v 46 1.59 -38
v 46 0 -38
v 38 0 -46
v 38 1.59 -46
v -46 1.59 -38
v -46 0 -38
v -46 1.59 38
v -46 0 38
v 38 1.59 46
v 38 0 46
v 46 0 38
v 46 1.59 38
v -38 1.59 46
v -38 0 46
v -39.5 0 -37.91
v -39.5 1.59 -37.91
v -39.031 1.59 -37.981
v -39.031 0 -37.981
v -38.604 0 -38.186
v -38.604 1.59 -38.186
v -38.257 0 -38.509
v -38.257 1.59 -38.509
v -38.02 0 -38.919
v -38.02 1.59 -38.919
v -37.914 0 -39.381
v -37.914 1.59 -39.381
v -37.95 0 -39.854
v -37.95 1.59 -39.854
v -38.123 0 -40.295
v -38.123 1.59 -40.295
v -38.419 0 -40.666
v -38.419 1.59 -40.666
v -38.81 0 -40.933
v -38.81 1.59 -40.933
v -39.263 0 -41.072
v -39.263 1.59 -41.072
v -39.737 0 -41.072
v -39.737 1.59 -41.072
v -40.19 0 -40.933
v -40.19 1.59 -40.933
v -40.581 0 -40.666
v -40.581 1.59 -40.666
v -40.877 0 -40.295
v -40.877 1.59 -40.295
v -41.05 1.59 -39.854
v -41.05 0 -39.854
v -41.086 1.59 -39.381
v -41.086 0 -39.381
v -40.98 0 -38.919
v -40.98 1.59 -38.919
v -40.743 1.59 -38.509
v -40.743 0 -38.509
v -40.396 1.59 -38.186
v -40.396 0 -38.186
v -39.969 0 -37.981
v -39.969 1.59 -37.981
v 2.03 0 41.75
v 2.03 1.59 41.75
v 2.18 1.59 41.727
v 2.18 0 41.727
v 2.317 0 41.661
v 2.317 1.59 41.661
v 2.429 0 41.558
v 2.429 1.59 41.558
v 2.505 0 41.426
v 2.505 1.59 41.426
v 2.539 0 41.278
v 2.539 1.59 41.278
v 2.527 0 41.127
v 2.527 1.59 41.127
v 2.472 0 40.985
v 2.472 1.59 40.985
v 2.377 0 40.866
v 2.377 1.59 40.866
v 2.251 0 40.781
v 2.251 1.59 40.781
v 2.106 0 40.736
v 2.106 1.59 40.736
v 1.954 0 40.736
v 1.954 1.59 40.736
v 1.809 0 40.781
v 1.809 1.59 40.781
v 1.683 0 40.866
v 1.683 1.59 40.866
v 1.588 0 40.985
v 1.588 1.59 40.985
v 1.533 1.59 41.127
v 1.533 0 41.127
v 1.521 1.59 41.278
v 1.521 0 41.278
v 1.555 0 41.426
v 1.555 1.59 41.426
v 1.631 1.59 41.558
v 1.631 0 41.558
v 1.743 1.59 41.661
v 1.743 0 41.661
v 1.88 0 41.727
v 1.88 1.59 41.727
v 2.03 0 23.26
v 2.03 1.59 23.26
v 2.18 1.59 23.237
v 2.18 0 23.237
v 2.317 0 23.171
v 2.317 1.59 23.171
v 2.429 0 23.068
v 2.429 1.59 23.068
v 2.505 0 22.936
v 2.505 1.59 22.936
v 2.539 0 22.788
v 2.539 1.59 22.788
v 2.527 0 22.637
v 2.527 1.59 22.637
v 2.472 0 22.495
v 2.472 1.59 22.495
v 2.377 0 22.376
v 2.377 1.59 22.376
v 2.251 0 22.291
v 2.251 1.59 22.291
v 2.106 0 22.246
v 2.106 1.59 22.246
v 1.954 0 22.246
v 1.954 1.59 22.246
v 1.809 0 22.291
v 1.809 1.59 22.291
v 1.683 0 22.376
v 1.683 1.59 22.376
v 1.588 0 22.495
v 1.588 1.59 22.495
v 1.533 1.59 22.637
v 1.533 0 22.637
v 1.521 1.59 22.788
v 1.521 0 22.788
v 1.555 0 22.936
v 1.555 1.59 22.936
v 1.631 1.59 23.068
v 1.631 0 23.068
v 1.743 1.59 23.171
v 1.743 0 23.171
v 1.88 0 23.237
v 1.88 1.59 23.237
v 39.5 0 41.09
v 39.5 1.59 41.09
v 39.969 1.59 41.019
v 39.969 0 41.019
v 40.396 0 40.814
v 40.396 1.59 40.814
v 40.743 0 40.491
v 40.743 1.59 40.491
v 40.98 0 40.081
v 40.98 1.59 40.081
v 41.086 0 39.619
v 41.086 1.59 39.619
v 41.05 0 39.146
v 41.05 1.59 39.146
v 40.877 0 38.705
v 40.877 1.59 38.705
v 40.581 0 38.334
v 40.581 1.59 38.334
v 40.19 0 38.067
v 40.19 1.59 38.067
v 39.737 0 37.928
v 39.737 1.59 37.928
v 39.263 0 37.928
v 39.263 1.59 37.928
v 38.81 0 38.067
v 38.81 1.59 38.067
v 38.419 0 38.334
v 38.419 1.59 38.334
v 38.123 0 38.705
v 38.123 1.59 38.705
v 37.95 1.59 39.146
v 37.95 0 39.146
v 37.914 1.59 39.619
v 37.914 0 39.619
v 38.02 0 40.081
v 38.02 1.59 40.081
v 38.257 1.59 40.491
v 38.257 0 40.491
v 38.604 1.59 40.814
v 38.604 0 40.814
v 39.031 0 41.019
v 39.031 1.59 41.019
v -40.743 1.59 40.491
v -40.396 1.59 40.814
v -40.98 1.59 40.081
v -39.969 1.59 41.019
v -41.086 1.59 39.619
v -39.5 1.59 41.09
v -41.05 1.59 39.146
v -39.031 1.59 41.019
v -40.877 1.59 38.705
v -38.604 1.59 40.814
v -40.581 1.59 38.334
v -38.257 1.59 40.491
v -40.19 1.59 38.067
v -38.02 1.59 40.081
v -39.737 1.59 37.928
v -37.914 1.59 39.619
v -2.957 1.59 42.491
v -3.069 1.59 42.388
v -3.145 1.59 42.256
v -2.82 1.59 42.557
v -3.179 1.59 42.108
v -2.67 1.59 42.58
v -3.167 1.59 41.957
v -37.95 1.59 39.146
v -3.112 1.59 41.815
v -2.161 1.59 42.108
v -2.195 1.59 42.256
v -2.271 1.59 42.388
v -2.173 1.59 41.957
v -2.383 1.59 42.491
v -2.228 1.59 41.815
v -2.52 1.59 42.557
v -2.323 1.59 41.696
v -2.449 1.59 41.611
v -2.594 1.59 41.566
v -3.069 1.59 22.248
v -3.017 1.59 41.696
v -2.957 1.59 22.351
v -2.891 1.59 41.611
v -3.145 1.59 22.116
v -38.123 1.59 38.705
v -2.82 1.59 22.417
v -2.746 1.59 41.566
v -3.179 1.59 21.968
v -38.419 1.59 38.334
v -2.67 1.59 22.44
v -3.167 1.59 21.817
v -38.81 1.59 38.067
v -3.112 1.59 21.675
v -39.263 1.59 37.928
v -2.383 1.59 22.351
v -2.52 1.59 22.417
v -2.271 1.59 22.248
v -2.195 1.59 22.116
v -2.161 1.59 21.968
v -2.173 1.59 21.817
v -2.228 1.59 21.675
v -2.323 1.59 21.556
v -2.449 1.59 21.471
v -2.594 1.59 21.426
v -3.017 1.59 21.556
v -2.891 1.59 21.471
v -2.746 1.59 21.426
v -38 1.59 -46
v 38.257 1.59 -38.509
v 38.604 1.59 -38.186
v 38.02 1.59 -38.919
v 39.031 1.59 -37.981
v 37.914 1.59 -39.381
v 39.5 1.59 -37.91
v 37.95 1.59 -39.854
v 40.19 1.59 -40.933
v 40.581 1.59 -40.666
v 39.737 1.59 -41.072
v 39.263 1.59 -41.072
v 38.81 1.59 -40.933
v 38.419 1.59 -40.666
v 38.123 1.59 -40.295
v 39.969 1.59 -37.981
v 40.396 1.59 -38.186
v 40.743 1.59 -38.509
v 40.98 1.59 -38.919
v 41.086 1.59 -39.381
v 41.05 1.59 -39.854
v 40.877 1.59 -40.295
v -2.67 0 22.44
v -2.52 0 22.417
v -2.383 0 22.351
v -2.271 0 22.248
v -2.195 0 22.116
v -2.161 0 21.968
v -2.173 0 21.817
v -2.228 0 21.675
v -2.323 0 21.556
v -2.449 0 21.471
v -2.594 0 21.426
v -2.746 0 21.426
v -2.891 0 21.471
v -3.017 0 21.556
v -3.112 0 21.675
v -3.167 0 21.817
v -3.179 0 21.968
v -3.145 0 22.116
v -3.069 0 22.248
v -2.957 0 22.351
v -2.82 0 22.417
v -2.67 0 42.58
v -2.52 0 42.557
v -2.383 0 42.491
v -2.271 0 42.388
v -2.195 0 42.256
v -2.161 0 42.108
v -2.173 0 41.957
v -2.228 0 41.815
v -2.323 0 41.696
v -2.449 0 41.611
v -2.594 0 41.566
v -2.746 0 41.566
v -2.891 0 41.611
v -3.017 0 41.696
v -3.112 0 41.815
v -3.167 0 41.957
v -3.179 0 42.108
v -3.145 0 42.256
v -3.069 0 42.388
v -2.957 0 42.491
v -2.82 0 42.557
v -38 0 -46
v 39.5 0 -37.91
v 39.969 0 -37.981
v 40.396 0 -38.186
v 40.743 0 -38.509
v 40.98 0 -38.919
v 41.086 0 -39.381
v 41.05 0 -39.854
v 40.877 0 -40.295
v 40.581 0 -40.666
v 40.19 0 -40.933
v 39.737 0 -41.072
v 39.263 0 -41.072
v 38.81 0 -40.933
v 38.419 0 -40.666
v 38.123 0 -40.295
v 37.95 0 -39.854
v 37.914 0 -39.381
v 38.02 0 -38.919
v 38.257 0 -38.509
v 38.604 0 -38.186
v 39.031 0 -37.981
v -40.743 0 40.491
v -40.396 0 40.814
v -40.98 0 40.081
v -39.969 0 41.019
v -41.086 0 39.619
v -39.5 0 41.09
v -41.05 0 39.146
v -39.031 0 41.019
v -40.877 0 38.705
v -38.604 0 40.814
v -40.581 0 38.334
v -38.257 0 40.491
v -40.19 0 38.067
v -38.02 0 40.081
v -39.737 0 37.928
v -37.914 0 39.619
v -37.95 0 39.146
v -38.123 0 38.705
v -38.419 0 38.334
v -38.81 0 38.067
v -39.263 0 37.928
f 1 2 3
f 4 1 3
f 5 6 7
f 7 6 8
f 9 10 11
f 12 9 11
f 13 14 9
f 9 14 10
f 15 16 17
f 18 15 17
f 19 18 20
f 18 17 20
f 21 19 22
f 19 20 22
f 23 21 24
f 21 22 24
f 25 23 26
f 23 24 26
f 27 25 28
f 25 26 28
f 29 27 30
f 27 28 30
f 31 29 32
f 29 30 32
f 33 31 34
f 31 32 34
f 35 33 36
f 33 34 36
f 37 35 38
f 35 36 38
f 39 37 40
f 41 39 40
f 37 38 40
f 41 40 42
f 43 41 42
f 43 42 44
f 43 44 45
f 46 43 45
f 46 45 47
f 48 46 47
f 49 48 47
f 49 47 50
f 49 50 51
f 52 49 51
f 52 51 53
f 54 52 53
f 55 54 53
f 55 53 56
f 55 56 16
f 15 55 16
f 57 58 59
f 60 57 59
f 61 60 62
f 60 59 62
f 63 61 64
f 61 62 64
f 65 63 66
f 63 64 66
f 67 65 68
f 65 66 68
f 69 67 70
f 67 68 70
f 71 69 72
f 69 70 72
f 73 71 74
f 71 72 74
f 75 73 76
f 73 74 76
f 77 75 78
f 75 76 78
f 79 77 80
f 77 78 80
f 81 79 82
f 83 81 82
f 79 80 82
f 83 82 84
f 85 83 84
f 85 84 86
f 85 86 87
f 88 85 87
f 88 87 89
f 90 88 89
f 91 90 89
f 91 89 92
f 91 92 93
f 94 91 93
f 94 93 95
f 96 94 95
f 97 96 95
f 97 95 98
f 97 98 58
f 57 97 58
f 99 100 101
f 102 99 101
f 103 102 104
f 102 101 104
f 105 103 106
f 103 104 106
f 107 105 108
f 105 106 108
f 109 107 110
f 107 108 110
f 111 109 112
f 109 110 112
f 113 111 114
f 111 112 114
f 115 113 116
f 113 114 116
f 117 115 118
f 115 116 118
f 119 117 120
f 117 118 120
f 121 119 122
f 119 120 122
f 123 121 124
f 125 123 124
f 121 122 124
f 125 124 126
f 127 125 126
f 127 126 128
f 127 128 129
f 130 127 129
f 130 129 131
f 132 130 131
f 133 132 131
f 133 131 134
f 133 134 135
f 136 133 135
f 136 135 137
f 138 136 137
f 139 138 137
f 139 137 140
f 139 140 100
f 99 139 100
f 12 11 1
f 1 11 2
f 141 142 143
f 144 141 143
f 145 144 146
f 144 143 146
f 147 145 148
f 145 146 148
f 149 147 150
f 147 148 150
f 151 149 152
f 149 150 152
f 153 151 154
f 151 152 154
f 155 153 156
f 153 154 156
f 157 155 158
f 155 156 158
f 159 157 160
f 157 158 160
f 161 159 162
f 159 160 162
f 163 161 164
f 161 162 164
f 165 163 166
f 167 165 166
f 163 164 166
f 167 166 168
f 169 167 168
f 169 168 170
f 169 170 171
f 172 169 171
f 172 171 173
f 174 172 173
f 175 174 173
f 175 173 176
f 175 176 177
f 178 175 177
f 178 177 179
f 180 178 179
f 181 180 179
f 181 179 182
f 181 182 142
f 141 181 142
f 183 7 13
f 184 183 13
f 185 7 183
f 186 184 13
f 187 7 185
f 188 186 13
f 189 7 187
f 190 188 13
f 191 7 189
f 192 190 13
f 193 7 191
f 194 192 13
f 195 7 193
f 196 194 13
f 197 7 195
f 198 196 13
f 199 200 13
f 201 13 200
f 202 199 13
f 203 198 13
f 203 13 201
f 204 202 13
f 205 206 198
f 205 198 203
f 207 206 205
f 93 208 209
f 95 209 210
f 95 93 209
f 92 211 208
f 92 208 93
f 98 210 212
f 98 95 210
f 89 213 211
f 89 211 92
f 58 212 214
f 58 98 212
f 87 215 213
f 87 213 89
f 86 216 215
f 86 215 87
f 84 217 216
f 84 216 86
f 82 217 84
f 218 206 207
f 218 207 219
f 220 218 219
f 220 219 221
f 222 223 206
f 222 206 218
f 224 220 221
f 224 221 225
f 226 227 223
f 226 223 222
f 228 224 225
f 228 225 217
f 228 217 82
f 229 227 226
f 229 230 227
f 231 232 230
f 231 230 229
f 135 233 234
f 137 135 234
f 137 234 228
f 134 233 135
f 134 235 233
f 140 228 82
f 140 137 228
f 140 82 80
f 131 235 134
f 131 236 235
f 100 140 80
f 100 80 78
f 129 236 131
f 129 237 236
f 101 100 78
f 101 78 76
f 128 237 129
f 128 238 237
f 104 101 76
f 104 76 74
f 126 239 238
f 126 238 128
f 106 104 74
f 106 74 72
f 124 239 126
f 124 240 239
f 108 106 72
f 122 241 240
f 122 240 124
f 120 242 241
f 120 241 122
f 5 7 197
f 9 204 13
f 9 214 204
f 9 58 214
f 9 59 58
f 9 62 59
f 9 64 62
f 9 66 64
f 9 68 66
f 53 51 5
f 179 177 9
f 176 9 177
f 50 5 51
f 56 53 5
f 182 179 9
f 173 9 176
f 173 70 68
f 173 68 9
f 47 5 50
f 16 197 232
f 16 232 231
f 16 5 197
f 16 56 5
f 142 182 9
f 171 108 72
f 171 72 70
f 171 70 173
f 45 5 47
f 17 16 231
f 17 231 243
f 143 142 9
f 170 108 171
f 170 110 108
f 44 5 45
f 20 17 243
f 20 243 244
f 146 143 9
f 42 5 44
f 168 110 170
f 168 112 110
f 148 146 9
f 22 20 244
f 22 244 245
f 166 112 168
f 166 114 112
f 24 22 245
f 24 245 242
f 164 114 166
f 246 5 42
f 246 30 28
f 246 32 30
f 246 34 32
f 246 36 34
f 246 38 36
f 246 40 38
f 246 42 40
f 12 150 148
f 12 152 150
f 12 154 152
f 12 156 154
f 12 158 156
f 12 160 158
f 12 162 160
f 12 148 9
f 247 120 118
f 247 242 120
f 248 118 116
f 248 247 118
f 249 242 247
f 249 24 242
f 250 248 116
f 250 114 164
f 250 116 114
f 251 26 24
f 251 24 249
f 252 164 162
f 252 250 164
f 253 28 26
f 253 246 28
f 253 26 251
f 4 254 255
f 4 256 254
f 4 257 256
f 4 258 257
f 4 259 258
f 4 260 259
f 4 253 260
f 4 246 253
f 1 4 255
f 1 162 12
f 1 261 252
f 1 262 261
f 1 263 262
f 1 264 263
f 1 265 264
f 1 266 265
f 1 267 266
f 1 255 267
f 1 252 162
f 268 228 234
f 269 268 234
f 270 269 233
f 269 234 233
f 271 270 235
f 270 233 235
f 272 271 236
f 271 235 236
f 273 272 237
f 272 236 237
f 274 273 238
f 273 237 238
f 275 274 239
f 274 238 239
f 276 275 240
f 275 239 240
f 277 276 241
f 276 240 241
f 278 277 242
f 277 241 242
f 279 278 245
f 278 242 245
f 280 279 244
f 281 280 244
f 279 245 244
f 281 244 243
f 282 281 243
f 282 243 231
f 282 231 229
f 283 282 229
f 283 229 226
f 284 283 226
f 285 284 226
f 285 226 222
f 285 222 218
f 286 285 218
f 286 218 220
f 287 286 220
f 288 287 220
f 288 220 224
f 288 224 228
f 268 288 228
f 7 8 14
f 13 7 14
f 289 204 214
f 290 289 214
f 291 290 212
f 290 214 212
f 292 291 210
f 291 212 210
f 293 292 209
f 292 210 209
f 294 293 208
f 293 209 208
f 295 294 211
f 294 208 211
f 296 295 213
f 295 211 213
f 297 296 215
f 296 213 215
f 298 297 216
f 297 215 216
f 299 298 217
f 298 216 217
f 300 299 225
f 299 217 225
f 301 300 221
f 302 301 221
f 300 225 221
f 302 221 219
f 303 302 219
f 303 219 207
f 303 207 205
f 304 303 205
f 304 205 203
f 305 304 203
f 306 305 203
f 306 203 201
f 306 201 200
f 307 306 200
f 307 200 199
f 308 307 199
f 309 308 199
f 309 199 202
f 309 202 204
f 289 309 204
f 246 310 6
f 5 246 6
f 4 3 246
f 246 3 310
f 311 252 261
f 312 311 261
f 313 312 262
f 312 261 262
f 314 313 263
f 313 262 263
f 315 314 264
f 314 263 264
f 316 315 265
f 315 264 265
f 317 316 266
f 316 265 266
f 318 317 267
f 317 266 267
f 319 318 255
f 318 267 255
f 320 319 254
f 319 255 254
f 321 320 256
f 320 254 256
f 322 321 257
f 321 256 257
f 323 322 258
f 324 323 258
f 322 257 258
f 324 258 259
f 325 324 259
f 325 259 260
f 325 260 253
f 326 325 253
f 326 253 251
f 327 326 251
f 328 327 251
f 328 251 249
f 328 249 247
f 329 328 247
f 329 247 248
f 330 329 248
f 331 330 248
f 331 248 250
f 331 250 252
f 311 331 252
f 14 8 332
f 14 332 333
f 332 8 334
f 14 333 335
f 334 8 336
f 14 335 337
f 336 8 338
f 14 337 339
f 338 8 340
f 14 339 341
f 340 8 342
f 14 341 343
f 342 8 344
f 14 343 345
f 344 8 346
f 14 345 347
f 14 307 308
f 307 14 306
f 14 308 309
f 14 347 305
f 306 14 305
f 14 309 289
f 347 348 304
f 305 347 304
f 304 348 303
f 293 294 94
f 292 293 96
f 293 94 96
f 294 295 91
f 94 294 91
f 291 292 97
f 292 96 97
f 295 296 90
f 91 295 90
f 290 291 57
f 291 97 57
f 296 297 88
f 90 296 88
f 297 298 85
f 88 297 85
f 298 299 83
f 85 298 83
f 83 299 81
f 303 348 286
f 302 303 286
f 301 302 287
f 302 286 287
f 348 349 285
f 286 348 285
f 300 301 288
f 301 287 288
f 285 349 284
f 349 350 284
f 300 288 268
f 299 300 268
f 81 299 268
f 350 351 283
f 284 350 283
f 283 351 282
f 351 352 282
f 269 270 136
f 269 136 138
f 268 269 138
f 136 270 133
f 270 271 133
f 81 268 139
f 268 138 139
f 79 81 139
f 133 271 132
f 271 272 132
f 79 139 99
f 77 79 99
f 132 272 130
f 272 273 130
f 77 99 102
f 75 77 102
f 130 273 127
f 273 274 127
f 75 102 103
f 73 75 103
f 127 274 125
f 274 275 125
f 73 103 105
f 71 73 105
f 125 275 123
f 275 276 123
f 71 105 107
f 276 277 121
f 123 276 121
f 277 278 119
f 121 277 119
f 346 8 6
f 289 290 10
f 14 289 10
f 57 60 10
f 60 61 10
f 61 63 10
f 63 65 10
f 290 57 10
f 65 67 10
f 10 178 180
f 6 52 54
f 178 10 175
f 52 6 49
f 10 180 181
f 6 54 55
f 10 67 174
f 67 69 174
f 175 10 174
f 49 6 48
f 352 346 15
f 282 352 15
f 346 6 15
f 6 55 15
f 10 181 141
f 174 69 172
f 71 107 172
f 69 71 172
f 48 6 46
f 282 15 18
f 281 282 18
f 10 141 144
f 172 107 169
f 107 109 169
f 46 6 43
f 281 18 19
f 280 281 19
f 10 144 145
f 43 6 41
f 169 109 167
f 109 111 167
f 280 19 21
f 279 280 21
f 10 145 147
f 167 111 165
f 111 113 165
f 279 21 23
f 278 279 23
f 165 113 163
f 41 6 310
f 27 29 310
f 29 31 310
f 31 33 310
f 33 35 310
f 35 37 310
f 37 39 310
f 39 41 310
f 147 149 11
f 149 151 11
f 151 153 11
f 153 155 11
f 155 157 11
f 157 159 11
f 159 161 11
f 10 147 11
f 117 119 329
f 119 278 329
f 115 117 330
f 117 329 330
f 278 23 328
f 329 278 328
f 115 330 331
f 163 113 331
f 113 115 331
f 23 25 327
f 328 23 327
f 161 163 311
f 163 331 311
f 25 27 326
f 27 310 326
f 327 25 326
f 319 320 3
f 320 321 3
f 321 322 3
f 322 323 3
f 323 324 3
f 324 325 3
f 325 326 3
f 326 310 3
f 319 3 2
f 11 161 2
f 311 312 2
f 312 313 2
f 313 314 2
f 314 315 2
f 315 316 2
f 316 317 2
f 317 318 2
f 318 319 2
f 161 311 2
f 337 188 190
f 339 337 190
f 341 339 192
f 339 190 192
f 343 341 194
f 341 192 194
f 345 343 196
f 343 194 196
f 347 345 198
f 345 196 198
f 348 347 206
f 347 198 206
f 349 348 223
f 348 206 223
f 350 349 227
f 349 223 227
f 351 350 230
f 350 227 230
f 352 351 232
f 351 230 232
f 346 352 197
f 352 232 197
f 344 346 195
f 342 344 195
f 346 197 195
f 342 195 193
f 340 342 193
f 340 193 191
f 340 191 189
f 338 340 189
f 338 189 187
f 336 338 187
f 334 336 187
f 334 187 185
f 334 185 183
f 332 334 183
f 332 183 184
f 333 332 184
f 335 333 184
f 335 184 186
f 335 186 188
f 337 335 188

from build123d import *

# Parameters (mm, degrees)
BOSS_EXTRUDE1_DEPTH = 1.59
SKETCH3_R           = 1.59
SKETCH3_R_2         = 0.51
CUT_EXTRUDE1_DEPTH  = 66.073251801


with BuildPart() as part:
    # Sketch1 → Boss-Extrude1 (new body)
    with BuildSketch(Plane(origin=(0, 0, 0), x_dir=(1, 0, 0), z_dir=(0, 1, 0))):
        Polygon((-38, 46), (-46, 38), (-46, -38), (-38, -46), (38, -46), (46, -38), (46, 38), (38, 46), align=None)
    extrude(amount=BOSS_EXTRUDE1_DEPTH)

    # Sketch3 → Cut-Extrude1 (cut, through all)
    with BuildSketch(Plane(origin=(0, 1.59, 0), x_dir=(1, 0, 0), z_dir=(0, 1, 0))):
        with Locations(Location((-39.5, 39.5, 0), (0, 0, 270))):
            Circle(SKETCH3_R)
        with Locations(Location((39.5, 39.5, 0), (0, 0, 270))):
            Circle(SKETCH3_R)
        with Locations(Location((39.5, -39.5, 0), (0, 0, 270))):
            Circle(SKETCH3_R)
        with Locations(Location((-39.5, -39.5, 0), (0, 0, 270))):
            Circle(SKETCH3_R)
        with Locations(Location((-2.67, -21.93, 0), (0, 0, 270))):
            Circle(SKETCH3_R_2)
        with Locations(Location((2.03, -22.75, 0), (0, 0, 270))):
            Circle(SKETCH3_R_2)
        with Locations(Location((-2.67, -42.07, 0), (0, 0, 270))):
            Circle(SKETCH3_R_2)
        with Locations(Location((2.03, -41.24, 0), (0, 0, 270))):
            Circle(SKETCH3_R_2)
    extrude(amount=-CUT_EXTRUDE1_DEPTH, mode=Mode.SUBTRACT)


solid = part.part
